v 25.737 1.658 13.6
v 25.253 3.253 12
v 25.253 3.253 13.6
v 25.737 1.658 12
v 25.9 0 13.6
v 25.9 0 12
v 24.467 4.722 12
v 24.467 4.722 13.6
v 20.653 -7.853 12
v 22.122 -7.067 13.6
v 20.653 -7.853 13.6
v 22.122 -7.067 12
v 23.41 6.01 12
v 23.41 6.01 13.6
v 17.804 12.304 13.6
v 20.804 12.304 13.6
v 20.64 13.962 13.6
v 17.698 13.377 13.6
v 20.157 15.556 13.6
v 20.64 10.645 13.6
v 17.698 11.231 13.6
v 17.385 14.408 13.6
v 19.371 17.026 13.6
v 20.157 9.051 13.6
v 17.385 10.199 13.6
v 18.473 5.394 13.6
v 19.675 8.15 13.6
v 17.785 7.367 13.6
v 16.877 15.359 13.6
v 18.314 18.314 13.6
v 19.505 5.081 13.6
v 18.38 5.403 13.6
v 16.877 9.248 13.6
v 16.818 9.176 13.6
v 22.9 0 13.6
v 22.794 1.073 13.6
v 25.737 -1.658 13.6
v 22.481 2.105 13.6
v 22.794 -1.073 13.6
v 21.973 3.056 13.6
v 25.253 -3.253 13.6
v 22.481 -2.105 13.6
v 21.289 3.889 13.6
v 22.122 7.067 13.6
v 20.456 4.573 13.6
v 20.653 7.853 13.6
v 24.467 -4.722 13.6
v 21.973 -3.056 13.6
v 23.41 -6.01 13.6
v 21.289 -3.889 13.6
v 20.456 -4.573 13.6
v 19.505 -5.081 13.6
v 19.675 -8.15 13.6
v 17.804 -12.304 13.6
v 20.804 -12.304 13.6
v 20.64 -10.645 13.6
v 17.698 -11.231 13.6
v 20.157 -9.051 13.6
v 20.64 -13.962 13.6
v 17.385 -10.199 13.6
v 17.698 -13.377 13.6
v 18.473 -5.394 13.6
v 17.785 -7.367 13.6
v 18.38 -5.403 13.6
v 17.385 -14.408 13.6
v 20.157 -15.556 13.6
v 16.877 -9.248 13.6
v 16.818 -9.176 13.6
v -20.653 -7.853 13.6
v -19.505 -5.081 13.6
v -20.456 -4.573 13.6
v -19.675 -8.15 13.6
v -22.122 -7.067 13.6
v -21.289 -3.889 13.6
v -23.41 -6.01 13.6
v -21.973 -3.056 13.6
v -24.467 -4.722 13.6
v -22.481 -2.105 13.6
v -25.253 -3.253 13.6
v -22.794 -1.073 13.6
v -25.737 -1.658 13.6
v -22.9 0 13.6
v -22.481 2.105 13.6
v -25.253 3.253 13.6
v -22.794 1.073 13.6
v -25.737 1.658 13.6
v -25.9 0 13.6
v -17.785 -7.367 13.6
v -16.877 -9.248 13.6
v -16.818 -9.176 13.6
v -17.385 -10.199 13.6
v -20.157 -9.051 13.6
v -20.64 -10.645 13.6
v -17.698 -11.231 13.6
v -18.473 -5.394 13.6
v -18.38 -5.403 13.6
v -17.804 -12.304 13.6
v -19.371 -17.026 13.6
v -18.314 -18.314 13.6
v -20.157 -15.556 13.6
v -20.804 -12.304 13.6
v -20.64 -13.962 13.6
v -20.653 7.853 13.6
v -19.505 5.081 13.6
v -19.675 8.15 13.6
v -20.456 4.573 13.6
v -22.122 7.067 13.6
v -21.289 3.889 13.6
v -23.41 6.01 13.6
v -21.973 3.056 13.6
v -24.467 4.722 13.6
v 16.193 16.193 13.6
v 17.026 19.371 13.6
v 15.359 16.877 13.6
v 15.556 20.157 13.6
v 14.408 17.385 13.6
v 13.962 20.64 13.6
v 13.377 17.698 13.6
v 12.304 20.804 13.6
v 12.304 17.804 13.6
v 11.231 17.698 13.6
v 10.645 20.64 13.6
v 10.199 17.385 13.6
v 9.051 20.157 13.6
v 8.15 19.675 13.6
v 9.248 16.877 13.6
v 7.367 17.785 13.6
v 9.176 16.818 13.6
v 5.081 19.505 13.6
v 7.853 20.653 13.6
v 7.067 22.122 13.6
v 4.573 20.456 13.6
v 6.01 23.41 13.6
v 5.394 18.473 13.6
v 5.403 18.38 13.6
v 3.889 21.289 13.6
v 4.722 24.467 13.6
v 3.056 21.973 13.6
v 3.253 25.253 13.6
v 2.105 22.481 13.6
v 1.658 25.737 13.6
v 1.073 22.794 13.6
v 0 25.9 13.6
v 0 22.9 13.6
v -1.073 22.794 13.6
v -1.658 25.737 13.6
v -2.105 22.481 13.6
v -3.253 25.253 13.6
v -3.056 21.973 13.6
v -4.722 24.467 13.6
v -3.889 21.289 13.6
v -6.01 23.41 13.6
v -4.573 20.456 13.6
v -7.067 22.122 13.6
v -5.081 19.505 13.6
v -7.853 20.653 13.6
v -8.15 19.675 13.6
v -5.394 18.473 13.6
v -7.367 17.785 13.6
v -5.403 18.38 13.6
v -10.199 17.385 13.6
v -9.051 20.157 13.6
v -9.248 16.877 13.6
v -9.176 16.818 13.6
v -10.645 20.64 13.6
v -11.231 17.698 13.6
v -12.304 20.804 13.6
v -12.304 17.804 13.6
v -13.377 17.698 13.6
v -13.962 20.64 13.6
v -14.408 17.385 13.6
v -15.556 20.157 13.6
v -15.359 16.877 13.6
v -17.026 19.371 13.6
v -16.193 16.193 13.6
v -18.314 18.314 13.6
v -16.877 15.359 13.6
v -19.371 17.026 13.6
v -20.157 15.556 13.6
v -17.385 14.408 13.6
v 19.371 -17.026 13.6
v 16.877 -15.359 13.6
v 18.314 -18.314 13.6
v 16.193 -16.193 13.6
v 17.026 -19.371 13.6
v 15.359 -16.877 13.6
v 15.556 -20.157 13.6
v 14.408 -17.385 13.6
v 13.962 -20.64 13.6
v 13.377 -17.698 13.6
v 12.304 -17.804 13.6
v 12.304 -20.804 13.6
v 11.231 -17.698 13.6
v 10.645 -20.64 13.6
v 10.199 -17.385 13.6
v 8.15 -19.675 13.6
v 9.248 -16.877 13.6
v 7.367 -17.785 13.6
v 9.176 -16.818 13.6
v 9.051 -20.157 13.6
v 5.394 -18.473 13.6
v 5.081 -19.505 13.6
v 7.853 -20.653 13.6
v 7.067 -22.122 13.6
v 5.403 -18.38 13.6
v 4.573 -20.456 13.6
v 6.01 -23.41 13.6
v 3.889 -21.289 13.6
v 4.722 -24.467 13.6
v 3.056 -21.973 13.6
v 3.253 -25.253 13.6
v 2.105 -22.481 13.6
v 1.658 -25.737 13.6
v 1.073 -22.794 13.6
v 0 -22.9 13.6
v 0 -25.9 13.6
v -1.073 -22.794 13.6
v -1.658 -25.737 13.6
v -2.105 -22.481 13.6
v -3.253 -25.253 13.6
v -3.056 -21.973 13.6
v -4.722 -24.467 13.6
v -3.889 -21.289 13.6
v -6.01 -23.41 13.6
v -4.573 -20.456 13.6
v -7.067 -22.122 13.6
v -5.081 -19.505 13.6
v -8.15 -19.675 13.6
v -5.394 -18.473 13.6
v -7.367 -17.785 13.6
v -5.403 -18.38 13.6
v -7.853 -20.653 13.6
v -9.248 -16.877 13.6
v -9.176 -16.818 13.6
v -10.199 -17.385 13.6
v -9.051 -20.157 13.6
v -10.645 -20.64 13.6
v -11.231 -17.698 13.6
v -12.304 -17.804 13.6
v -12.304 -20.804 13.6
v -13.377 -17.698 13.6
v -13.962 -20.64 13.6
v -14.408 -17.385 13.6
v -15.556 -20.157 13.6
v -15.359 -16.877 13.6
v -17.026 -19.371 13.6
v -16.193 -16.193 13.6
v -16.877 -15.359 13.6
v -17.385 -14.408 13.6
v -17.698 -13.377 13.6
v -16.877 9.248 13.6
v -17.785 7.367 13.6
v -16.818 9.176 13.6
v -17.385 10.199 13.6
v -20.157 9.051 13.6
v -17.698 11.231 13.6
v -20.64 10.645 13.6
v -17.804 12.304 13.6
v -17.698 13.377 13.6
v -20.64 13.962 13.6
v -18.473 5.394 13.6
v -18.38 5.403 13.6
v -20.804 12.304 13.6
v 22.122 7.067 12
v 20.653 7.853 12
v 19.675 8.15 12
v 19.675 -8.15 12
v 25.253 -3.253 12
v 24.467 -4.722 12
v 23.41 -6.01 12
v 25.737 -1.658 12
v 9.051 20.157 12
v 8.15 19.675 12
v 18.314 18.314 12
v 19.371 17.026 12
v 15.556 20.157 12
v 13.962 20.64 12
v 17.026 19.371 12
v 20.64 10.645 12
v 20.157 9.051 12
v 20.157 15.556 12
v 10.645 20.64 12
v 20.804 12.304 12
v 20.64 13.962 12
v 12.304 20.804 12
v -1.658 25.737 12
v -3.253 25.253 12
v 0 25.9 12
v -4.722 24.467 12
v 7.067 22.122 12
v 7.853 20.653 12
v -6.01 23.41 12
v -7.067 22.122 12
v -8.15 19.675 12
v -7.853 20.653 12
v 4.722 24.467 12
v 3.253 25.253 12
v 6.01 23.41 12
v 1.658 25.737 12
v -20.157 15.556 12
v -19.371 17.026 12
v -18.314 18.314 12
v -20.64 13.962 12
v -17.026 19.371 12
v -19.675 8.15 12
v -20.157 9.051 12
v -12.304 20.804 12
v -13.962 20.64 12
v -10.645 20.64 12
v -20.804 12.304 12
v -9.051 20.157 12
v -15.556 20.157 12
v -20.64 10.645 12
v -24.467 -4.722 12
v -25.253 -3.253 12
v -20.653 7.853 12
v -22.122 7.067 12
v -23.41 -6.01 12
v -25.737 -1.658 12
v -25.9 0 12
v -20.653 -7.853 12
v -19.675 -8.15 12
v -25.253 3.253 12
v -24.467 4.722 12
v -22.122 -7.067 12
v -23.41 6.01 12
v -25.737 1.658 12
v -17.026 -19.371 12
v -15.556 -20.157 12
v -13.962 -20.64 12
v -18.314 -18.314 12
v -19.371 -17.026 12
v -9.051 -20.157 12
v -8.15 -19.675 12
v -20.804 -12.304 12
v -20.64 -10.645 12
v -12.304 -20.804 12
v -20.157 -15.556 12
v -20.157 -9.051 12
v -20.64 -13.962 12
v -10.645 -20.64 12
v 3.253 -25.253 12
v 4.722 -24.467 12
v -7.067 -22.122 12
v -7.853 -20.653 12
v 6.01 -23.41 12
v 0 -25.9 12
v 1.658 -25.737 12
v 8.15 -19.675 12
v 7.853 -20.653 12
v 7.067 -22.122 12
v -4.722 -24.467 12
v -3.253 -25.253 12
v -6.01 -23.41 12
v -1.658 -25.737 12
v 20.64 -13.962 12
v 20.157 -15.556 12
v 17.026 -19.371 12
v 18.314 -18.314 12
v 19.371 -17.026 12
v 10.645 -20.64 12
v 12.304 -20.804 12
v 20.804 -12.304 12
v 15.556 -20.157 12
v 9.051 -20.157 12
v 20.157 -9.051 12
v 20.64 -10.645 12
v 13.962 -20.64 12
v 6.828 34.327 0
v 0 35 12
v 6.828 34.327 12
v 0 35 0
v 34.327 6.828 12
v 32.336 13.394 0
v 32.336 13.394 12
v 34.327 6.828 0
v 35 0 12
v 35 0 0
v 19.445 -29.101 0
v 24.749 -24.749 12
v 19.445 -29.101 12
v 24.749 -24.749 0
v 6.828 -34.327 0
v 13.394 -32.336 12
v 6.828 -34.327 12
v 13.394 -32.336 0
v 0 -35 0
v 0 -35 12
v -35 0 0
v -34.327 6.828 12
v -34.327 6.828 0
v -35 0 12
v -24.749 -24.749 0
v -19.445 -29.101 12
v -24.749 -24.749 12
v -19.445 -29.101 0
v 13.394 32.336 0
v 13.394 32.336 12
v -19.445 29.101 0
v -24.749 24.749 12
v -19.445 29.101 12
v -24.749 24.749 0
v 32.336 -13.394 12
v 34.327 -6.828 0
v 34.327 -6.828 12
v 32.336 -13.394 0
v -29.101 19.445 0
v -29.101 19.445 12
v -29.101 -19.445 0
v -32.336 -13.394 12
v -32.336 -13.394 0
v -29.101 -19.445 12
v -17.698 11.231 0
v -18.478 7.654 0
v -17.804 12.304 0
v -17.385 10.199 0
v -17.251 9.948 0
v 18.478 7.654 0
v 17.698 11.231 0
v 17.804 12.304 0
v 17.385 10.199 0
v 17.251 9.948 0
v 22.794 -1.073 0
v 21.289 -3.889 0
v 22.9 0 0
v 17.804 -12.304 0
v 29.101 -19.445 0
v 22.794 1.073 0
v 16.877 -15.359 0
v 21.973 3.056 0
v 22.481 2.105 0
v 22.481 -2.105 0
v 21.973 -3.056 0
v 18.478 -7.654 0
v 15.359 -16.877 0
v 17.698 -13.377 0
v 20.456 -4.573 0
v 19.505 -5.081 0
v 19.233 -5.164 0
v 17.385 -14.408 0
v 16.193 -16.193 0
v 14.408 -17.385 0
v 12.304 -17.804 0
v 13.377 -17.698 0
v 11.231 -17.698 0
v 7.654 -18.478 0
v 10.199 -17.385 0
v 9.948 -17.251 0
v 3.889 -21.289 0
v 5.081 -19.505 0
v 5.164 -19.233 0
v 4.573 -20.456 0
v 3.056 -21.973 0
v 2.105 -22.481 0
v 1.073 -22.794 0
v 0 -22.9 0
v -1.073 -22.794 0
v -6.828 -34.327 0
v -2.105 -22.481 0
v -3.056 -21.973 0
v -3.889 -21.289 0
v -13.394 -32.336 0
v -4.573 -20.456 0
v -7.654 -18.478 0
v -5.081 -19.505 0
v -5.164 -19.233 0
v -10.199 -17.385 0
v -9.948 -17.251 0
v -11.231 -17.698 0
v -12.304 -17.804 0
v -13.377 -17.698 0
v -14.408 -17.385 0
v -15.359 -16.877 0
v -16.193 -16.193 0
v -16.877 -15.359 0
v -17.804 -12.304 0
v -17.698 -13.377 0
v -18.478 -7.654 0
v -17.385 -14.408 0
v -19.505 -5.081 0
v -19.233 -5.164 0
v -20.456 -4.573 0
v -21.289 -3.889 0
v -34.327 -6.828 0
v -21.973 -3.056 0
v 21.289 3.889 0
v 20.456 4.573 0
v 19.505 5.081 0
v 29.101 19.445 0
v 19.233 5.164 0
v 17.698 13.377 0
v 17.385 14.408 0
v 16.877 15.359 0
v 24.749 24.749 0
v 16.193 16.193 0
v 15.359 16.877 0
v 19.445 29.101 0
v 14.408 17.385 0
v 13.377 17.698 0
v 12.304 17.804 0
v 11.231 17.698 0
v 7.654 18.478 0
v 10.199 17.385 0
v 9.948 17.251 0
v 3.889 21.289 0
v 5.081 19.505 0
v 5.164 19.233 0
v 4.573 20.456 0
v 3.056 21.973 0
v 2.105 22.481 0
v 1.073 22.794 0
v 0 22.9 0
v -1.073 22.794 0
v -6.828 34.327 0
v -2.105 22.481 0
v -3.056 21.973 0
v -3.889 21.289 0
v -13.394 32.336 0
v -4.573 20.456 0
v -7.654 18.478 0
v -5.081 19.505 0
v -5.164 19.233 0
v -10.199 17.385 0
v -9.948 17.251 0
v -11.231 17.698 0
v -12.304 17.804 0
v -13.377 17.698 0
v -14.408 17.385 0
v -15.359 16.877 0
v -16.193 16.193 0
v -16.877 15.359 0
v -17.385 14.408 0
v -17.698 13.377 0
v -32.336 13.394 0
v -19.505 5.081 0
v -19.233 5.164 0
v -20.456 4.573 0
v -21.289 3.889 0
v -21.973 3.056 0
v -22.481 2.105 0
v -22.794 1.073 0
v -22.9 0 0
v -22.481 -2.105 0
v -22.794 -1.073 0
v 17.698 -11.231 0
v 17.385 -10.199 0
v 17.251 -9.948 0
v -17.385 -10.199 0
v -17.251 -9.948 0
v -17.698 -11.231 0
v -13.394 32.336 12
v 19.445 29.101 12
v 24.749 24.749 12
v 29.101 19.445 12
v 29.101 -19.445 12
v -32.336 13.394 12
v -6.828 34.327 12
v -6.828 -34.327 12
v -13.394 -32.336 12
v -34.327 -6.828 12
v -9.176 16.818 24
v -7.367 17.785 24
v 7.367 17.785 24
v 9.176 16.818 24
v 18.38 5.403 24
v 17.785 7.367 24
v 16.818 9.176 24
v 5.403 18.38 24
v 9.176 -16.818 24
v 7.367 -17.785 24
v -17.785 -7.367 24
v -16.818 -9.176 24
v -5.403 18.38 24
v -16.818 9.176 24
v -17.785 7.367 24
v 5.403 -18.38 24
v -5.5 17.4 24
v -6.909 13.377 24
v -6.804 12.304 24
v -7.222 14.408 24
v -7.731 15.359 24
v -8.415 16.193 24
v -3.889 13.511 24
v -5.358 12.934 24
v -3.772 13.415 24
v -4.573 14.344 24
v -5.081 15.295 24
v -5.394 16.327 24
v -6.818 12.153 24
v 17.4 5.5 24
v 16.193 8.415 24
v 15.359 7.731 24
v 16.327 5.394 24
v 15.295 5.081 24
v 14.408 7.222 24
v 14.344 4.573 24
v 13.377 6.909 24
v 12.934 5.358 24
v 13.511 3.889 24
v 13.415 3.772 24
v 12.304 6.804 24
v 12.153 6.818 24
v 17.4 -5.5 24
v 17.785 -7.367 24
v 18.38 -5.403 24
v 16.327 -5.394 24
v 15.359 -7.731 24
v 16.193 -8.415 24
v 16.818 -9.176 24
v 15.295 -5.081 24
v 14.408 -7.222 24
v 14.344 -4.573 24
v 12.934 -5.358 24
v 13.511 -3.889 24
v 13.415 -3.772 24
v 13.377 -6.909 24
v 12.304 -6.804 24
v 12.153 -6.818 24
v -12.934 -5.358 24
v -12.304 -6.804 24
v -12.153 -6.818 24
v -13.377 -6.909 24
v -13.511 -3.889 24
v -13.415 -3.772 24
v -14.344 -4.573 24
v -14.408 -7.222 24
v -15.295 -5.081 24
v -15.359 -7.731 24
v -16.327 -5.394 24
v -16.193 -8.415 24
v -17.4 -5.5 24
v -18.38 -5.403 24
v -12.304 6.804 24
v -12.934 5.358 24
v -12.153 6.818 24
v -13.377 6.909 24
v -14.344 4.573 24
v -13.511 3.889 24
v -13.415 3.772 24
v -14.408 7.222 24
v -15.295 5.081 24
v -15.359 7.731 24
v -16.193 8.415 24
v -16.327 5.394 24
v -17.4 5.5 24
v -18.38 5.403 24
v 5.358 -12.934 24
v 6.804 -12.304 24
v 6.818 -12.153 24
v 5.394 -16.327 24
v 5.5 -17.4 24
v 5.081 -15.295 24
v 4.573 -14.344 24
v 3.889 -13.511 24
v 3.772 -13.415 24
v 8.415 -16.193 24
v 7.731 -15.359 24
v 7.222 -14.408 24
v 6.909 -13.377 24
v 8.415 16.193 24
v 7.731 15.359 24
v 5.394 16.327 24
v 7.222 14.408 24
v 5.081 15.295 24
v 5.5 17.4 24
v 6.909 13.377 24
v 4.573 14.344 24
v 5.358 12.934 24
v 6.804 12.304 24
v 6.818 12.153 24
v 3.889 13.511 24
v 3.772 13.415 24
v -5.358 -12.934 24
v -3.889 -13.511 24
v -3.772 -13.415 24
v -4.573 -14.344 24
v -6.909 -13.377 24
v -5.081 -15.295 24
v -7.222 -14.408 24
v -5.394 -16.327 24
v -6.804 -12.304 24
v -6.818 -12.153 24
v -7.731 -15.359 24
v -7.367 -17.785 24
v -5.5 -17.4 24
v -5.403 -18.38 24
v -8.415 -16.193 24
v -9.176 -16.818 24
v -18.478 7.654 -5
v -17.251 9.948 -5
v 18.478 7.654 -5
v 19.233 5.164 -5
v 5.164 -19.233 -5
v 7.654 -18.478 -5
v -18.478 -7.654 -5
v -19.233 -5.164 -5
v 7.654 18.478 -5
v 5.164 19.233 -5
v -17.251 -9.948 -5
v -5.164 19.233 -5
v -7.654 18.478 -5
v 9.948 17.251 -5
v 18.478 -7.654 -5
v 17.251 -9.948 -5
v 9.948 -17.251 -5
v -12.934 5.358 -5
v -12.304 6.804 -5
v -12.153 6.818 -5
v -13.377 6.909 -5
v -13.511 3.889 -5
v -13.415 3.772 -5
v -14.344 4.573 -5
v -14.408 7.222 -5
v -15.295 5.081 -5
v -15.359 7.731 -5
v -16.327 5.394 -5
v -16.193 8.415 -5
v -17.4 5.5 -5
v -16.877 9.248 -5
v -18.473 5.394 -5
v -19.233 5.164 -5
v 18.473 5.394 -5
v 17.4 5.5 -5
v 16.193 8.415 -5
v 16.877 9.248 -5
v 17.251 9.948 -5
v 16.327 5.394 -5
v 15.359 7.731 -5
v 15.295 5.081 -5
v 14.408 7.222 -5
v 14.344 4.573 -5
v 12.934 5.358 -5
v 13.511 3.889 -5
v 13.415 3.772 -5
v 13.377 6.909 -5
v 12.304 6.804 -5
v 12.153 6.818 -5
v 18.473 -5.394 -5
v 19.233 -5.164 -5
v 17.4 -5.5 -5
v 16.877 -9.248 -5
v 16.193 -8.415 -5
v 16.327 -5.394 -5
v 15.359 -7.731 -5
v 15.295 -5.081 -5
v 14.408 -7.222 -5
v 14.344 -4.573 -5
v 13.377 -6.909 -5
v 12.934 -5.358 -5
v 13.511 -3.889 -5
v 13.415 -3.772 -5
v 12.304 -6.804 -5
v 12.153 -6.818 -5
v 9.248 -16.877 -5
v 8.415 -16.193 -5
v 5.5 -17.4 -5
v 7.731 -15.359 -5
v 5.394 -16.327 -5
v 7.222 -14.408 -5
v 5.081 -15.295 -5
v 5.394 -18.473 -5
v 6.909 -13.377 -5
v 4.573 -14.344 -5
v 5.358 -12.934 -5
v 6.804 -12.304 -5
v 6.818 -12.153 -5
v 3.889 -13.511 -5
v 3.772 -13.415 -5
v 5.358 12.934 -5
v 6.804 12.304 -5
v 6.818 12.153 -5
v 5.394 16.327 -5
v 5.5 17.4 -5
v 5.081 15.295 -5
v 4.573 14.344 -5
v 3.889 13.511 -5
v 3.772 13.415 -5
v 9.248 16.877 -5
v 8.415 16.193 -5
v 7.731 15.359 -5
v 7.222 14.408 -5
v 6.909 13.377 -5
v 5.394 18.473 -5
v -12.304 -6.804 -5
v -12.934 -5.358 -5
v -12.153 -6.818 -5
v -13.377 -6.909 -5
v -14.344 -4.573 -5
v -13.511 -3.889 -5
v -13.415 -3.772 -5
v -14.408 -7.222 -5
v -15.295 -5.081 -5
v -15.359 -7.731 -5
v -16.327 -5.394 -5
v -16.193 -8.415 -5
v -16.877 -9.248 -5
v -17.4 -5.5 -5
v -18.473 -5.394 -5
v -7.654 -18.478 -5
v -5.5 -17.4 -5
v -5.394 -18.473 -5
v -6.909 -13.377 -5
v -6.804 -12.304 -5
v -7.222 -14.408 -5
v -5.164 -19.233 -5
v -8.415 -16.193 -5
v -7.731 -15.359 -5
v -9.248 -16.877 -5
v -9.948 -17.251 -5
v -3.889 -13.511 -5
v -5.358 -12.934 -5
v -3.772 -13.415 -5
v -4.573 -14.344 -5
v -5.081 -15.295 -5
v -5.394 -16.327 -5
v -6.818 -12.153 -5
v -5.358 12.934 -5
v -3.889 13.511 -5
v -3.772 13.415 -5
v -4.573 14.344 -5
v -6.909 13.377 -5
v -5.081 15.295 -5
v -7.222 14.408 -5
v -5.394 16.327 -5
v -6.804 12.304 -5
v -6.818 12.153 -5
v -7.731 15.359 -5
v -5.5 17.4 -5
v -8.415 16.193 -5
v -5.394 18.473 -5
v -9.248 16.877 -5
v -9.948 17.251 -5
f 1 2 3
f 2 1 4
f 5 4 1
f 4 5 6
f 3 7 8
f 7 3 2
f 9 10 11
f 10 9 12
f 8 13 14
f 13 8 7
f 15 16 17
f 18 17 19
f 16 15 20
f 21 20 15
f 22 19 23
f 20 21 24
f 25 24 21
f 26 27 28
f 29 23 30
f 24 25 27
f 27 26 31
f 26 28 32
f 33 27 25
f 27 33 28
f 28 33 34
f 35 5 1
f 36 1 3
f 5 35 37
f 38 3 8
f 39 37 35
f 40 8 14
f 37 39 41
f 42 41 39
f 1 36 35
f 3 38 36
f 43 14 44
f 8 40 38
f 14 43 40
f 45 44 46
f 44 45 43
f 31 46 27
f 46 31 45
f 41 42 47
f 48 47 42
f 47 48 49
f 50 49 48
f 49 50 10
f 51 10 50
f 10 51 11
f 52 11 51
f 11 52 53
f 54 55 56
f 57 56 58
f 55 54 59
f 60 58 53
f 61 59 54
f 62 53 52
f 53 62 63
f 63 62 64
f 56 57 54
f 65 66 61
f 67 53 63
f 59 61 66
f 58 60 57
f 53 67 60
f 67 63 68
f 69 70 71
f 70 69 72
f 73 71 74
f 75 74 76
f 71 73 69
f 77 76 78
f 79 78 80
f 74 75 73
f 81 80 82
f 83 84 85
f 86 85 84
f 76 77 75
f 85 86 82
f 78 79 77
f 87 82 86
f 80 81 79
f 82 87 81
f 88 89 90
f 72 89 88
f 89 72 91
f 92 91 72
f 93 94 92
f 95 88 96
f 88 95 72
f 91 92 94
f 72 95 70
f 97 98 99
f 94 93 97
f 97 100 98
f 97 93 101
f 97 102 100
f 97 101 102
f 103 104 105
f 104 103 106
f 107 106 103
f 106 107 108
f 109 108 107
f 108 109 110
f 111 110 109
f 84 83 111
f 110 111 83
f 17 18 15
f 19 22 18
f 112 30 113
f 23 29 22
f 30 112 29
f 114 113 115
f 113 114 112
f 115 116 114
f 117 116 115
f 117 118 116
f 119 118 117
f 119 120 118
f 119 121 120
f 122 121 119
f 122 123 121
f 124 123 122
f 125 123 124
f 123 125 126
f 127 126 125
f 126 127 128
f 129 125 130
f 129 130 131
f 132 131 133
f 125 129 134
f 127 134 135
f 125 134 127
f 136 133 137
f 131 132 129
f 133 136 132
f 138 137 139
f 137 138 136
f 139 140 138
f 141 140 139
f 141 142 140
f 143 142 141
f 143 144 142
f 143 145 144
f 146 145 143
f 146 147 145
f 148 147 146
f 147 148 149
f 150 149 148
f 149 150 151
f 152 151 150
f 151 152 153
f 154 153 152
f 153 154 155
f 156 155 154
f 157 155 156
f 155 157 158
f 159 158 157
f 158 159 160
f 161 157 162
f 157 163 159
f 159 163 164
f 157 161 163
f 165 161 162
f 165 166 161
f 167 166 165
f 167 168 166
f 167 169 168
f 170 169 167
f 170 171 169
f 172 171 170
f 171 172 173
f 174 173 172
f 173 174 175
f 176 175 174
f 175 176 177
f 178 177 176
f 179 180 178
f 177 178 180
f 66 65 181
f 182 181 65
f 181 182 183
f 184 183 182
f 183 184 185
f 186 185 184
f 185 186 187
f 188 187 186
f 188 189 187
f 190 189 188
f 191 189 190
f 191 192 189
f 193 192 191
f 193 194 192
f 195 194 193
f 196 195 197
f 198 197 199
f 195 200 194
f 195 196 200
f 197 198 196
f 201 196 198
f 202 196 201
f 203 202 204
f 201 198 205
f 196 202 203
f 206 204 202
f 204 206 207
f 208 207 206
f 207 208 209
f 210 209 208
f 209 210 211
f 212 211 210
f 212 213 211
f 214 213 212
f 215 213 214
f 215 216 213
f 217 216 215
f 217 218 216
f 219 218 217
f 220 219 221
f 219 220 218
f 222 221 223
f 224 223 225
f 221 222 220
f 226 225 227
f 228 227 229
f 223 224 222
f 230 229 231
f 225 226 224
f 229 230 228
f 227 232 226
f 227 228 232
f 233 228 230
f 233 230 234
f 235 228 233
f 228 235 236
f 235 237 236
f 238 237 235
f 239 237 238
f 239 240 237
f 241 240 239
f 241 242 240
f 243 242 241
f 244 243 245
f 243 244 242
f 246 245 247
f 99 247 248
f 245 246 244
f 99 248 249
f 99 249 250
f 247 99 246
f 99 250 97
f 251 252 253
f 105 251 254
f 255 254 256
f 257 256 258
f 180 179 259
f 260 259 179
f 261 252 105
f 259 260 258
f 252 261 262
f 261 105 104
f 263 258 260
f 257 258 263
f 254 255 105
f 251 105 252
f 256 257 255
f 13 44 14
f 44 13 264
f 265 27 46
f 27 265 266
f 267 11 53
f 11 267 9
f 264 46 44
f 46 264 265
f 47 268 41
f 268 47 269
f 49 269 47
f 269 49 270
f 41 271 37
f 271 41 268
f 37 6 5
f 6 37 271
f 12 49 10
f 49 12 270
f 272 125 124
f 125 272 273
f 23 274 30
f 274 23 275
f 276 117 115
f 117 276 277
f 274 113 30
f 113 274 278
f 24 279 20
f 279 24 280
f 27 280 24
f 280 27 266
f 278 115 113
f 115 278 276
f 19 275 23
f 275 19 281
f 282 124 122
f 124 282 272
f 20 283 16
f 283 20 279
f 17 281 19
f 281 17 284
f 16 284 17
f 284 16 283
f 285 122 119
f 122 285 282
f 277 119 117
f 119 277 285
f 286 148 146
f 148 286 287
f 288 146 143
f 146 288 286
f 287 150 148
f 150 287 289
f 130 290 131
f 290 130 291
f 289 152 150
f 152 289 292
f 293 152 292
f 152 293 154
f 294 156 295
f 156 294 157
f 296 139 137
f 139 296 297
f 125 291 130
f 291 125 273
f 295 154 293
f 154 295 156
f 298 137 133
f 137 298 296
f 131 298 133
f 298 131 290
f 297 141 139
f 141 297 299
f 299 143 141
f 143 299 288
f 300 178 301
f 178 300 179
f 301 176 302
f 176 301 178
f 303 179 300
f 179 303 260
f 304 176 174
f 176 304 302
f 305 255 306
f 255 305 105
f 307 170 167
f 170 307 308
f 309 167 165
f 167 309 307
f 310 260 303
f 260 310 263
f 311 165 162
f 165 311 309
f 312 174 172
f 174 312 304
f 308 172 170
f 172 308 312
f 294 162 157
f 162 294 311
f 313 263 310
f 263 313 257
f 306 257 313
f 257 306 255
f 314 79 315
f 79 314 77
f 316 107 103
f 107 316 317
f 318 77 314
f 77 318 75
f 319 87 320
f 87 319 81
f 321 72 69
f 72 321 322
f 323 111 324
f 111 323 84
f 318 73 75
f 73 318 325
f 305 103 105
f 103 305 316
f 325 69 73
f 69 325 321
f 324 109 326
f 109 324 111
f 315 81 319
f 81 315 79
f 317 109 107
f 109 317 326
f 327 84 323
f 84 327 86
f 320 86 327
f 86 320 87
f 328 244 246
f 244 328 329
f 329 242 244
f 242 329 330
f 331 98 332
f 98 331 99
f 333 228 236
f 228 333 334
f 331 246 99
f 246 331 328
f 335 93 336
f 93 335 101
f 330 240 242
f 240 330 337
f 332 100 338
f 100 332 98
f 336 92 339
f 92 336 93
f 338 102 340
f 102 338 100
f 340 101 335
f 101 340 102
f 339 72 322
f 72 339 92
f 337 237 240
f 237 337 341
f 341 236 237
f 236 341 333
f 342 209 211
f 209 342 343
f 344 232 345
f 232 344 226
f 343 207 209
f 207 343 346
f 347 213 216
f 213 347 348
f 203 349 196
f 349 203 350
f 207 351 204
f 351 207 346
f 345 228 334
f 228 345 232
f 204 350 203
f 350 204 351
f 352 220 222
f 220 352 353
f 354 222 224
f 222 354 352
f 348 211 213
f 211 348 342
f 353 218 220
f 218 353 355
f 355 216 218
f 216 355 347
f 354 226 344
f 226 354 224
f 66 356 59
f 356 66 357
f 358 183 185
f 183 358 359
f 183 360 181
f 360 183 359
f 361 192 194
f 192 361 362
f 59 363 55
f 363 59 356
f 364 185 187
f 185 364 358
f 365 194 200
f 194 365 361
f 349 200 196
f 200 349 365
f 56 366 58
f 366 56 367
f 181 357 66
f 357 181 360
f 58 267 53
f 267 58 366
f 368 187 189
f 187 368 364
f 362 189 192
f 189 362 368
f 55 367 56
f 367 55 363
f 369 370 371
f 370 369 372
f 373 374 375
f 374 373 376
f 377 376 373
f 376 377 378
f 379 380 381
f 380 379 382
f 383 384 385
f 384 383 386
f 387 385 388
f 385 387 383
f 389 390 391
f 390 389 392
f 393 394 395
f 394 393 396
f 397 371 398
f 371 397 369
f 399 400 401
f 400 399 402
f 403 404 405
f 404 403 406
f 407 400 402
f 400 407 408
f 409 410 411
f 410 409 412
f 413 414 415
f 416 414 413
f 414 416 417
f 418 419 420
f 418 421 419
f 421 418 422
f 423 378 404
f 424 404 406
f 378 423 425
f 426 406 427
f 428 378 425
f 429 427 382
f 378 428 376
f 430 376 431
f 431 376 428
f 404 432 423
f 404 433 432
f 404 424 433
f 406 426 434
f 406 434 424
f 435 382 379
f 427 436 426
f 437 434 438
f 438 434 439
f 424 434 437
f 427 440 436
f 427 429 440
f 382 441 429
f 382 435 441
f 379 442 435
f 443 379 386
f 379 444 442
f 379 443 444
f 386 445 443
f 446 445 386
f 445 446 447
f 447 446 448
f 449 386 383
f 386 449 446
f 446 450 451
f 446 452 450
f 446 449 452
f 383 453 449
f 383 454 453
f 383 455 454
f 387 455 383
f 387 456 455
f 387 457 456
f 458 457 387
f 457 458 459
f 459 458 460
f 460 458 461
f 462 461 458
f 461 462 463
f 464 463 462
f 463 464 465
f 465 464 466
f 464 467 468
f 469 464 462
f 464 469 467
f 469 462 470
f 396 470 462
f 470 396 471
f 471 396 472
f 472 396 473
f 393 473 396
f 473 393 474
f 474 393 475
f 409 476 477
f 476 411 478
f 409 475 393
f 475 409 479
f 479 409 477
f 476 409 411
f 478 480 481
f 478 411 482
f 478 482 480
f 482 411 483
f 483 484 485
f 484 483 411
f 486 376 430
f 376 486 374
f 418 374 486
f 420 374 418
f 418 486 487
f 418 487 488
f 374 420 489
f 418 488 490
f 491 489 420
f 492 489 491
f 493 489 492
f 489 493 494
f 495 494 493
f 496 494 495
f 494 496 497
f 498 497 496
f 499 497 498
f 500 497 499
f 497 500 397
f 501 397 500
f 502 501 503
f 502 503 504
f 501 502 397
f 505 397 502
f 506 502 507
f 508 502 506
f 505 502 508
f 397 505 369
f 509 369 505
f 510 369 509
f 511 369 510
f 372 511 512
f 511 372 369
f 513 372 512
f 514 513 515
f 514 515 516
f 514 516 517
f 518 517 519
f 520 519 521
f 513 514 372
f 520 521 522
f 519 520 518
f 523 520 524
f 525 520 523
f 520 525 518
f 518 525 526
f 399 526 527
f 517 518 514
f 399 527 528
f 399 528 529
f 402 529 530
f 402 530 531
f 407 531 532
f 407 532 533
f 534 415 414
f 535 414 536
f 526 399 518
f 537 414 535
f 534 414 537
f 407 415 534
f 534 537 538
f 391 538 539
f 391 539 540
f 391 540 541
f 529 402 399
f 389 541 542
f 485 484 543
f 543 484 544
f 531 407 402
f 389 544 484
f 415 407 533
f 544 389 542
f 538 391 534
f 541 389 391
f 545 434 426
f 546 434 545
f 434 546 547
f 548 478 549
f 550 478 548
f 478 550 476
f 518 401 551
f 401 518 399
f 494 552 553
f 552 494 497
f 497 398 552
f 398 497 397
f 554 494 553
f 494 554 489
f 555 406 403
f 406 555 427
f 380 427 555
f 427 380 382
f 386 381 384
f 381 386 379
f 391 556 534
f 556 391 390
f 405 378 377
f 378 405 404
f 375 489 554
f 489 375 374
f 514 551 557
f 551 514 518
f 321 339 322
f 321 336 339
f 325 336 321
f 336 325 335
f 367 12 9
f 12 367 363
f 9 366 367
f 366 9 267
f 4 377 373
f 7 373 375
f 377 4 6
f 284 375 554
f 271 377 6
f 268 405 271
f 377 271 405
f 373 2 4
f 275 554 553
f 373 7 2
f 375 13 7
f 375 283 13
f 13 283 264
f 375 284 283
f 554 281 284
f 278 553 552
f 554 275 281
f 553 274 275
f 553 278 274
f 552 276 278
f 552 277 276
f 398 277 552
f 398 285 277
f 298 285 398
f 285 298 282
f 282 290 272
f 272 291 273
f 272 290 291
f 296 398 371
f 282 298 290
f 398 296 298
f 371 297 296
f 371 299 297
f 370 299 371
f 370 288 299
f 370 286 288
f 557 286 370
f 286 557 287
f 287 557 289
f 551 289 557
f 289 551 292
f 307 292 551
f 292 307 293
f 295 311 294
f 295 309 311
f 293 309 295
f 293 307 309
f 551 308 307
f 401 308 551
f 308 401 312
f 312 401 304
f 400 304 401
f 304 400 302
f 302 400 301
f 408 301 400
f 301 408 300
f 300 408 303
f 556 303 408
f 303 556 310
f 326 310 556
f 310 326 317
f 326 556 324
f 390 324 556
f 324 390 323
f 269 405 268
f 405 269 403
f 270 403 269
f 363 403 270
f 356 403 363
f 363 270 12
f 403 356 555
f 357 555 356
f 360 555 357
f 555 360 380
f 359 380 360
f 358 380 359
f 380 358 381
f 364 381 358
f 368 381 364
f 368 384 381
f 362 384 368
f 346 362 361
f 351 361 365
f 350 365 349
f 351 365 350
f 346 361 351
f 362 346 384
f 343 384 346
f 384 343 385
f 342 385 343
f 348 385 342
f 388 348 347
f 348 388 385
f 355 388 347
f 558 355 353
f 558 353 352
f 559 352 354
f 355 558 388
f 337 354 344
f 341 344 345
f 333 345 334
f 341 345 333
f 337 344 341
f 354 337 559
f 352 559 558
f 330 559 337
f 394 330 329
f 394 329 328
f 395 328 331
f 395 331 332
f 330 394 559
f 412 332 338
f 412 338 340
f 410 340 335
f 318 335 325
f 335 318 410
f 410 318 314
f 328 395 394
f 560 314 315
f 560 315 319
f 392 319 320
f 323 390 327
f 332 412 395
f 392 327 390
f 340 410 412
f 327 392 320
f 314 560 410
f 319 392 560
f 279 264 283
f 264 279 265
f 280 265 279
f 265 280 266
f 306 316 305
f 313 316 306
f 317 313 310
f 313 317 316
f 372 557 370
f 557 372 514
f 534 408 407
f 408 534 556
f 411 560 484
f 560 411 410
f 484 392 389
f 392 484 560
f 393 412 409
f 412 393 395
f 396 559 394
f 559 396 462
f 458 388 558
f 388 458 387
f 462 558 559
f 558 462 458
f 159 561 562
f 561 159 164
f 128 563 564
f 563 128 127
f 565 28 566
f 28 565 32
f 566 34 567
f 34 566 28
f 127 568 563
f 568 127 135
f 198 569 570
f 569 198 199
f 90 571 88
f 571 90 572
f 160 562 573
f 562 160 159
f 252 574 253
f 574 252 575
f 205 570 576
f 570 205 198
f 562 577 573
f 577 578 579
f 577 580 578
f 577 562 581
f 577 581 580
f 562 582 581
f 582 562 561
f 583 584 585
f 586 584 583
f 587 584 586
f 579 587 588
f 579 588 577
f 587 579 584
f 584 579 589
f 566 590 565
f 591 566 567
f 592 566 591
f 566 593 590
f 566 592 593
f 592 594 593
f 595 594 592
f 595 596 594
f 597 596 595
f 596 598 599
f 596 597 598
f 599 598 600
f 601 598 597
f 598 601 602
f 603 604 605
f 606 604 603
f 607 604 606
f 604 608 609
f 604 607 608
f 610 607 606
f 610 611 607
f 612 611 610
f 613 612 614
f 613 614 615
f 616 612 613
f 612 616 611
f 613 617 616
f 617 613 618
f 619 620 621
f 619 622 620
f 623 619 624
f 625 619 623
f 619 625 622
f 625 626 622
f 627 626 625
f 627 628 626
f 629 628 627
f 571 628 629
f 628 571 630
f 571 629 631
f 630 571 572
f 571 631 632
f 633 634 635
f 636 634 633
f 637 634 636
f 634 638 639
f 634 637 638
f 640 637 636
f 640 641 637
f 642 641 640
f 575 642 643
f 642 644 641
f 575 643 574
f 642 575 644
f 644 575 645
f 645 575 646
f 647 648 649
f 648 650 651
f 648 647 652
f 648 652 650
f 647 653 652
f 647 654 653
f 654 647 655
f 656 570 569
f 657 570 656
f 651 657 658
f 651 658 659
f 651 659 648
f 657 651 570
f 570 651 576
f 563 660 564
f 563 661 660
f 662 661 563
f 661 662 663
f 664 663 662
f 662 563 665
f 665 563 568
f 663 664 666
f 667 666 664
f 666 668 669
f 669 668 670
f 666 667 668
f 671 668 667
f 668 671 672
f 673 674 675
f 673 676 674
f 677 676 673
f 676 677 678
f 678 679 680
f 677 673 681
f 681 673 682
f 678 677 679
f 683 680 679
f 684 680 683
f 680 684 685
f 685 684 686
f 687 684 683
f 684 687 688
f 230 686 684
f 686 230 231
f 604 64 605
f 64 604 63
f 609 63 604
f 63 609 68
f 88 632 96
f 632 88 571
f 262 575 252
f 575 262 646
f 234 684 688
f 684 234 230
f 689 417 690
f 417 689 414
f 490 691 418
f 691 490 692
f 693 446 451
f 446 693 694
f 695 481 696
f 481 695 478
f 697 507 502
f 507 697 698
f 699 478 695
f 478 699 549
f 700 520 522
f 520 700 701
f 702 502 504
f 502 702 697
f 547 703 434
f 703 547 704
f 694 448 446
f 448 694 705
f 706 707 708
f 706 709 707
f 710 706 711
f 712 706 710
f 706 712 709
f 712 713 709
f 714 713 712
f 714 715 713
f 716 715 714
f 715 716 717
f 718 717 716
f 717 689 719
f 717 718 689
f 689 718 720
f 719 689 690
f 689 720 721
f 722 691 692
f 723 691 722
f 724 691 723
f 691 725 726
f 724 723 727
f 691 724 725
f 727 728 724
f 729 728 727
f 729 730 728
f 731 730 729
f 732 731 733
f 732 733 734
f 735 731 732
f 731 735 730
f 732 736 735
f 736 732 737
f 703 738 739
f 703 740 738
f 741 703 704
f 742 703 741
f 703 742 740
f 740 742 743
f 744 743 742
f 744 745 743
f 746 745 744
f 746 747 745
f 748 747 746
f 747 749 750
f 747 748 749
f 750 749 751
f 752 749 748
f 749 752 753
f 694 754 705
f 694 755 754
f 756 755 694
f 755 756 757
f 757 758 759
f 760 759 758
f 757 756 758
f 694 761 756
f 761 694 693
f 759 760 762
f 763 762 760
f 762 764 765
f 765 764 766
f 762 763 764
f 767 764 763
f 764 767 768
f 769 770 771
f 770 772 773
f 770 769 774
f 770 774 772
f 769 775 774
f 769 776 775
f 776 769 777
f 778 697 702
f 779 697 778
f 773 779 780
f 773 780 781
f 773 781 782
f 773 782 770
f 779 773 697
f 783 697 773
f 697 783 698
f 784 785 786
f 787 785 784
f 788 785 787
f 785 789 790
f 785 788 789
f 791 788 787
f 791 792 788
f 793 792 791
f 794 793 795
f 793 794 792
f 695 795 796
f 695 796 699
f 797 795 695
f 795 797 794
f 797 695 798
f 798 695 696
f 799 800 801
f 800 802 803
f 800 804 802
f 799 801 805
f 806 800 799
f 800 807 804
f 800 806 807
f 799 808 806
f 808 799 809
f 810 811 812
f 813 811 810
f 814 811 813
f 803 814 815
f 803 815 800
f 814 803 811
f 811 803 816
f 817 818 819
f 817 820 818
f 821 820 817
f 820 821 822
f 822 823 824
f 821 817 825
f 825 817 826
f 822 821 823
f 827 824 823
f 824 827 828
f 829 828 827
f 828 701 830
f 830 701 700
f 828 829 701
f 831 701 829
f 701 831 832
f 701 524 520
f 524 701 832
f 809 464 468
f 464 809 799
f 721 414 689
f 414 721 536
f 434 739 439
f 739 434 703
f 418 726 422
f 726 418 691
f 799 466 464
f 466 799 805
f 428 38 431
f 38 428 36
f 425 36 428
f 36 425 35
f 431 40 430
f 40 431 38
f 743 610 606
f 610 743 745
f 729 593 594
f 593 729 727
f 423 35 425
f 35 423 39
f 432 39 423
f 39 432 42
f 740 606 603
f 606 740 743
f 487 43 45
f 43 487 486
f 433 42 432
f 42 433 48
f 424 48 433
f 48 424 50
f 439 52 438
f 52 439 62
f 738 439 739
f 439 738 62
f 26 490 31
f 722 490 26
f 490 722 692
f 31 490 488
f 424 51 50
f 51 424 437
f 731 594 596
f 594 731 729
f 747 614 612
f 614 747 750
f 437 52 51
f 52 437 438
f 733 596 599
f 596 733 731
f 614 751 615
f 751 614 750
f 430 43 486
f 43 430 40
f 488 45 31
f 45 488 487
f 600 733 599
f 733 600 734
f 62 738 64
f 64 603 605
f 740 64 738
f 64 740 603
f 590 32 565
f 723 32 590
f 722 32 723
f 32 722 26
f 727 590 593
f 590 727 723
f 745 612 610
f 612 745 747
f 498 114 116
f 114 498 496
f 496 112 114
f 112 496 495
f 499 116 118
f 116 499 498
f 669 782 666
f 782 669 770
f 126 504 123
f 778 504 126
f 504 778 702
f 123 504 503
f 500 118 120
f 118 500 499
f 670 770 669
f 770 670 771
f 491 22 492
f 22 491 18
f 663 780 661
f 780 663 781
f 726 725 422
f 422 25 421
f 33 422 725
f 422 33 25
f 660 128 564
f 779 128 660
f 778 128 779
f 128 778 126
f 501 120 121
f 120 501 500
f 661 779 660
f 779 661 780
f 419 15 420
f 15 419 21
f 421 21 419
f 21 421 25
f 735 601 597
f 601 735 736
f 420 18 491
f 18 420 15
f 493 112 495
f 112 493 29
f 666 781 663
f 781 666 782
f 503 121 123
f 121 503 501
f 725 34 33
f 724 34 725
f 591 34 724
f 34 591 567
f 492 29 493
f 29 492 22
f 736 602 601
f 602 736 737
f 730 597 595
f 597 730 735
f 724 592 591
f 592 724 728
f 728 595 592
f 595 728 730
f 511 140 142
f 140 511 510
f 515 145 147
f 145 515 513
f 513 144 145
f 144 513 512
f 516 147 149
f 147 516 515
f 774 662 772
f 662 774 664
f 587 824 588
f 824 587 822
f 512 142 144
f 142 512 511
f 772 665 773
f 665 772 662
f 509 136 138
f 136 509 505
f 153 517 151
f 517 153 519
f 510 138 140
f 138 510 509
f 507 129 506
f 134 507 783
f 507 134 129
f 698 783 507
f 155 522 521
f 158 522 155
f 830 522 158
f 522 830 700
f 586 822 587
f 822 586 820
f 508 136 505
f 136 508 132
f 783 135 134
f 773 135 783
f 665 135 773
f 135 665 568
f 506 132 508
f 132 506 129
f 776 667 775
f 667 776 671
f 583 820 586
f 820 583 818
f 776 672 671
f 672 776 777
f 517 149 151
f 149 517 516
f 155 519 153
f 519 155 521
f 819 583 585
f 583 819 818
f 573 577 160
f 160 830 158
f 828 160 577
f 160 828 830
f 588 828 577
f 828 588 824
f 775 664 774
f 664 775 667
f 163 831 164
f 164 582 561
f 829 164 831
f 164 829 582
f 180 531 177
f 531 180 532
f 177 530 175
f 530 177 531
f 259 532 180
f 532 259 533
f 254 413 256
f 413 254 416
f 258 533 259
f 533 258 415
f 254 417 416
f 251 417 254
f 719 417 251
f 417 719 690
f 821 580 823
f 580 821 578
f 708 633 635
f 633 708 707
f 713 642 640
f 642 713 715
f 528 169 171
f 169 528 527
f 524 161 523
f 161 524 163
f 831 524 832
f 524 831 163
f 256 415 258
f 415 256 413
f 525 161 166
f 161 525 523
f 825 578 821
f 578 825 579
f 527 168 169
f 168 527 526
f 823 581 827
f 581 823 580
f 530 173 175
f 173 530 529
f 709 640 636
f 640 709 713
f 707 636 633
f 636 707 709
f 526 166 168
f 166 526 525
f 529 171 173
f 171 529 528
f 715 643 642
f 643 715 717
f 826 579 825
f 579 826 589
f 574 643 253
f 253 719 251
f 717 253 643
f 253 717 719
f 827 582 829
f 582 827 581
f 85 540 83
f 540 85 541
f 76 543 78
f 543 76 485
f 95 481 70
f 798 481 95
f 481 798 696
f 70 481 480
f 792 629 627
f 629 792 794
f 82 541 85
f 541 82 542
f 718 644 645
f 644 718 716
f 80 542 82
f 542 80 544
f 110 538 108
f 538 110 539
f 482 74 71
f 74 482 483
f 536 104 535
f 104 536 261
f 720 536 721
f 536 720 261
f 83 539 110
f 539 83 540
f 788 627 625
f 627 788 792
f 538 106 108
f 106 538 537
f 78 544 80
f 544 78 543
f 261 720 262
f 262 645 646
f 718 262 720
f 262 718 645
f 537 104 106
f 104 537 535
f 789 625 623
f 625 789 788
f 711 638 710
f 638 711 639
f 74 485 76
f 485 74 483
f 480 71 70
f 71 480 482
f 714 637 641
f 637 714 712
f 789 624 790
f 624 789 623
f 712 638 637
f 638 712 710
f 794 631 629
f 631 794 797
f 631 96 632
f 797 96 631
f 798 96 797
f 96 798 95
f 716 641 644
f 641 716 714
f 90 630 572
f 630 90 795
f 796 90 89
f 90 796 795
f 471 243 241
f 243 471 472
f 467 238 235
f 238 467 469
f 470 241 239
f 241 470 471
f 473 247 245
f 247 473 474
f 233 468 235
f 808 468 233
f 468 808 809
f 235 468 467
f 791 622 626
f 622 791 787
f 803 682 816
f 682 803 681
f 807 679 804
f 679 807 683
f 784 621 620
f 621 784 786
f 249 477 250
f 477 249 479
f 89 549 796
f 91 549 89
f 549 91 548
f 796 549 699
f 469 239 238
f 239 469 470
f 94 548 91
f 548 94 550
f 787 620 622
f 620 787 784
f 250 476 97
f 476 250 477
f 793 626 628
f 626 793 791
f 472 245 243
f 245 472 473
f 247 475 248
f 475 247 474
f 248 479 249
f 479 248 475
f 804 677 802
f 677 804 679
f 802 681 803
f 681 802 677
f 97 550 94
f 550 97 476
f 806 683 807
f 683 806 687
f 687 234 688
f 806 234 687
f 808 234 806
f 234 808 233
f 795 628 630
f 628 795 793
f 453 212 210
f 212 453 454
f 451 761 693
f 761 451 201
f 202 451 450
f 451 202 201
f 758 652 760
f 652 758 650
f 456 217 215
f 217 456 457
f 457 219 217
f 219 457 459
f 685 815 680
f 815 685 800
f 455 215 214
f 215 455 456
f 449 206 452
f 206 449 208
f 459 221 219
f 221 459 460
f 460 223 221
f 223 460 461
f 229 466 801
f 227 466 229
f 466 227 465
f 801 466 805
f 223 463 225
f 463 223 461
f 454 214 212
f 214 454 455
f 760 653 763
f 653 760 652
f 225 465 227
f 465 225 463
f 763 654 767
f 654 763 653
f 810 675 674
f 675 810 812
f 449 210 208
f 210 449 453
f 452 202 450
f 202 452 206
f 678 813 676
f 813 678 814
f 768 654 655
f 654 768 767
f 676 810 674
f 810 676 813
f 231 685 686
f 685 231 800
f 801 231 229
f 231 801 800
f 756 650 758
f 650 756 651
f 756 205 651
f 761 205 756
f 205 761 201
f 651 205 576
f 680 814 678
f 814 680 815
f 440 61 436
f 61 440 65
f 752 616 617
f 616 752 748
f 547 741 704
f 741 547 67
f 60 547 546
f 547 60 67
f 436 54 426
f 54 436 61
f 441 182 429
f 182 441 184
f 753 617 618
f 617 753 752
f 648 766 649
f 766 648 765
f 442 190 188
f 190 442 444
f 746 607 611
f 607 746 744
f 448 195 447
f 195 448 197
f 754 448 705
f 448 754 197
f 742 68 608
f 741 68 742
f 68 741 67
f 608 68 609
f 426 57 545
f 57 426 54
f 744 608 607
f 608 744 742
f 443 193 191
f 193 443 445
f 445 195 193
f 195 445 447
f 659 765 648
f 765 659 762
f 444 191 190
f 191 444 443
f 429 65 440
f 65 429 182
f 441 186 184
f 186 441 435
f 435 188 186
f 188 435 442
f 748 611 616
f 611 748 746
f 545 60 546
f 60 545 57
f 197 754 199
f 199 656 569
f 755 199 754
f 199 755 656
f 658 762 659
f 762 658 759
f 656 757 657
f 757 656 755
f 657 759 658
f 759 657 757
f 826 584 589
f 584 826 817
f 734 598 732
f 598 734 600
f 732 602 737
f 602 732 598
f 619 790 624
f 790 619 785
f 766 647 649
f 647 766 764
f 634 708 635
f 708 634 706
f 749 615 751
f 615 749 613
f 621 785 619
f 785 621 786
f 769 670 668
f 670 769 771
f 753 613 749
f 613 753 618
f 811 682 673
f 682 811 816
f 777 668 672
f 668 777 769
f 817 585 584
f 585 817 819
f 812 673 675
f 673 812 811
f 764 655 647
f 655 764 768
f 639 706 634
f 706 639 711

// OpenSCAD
$fn = 32;

// ----------------------------------------------------------------------
// Bolt-circle flange: 70 mm outside, 8 bolt holes, bore 28 mm
// ----------------------------------------------------------------------

// --- parameters (mm) ---
flange_d = 70;            // flange outside diameter
flange_t = 12;            // flange thickness
bolts = 8;                // number of bolt holes
bolt_d = 11;              // bolt clearance
bolt_r = 17.4;            // bolt circle radius
bore_d = 28;              // centre bore
hub_d = 38.5;             // raised hub diameter
hub_h = 12;               // raised hub height
spigot_d = 40;            // spigot diameter
spigot_h = 6;             // spigot height below the flange
sink = 1;                 // overlap into the flange
spot_d = 17;              // spot faced bosses
spot_h = 1.6;             // spot face height

module body() {
  cylinder(h = flange_t, d = flange_d);
  /* raised hub, sunk 1 mm into the flange */
  translate([0, 0, flange_t - 1]) cylinder(h = hub_h + 1, d = hub_d);
  /* spigot on the back face, sunk into the flange */
  translate([0, 0, -spigot_h + sink]) cylinder(h = spigot_h, d = spigot_d);
  /* spot faced pads under the bolt heads */
  for (i = [0 : bolts - 1]) rotate([0, 0, i * 360 / bolts]) translate([bolt_r, 0, flange_t - 1]) cylinder(h = spot_h + 1, d = spot_d);
}

difference() {
  body();
  /* bolt circle */
  for (i = [0 : bolts - 1]) rotate([0, 0, i * 360 / bolts]) translate([bolt_r, 0, -spigot_h - 1]) cylinder(h = flange_t + hub_h + spigot_h + 3, d = bolt_d);
  translate([0, 0, -spigot_h - 1]) cylinder(h = flange_t + hub_h + spigot_h + 3, d = bore_d);
}
